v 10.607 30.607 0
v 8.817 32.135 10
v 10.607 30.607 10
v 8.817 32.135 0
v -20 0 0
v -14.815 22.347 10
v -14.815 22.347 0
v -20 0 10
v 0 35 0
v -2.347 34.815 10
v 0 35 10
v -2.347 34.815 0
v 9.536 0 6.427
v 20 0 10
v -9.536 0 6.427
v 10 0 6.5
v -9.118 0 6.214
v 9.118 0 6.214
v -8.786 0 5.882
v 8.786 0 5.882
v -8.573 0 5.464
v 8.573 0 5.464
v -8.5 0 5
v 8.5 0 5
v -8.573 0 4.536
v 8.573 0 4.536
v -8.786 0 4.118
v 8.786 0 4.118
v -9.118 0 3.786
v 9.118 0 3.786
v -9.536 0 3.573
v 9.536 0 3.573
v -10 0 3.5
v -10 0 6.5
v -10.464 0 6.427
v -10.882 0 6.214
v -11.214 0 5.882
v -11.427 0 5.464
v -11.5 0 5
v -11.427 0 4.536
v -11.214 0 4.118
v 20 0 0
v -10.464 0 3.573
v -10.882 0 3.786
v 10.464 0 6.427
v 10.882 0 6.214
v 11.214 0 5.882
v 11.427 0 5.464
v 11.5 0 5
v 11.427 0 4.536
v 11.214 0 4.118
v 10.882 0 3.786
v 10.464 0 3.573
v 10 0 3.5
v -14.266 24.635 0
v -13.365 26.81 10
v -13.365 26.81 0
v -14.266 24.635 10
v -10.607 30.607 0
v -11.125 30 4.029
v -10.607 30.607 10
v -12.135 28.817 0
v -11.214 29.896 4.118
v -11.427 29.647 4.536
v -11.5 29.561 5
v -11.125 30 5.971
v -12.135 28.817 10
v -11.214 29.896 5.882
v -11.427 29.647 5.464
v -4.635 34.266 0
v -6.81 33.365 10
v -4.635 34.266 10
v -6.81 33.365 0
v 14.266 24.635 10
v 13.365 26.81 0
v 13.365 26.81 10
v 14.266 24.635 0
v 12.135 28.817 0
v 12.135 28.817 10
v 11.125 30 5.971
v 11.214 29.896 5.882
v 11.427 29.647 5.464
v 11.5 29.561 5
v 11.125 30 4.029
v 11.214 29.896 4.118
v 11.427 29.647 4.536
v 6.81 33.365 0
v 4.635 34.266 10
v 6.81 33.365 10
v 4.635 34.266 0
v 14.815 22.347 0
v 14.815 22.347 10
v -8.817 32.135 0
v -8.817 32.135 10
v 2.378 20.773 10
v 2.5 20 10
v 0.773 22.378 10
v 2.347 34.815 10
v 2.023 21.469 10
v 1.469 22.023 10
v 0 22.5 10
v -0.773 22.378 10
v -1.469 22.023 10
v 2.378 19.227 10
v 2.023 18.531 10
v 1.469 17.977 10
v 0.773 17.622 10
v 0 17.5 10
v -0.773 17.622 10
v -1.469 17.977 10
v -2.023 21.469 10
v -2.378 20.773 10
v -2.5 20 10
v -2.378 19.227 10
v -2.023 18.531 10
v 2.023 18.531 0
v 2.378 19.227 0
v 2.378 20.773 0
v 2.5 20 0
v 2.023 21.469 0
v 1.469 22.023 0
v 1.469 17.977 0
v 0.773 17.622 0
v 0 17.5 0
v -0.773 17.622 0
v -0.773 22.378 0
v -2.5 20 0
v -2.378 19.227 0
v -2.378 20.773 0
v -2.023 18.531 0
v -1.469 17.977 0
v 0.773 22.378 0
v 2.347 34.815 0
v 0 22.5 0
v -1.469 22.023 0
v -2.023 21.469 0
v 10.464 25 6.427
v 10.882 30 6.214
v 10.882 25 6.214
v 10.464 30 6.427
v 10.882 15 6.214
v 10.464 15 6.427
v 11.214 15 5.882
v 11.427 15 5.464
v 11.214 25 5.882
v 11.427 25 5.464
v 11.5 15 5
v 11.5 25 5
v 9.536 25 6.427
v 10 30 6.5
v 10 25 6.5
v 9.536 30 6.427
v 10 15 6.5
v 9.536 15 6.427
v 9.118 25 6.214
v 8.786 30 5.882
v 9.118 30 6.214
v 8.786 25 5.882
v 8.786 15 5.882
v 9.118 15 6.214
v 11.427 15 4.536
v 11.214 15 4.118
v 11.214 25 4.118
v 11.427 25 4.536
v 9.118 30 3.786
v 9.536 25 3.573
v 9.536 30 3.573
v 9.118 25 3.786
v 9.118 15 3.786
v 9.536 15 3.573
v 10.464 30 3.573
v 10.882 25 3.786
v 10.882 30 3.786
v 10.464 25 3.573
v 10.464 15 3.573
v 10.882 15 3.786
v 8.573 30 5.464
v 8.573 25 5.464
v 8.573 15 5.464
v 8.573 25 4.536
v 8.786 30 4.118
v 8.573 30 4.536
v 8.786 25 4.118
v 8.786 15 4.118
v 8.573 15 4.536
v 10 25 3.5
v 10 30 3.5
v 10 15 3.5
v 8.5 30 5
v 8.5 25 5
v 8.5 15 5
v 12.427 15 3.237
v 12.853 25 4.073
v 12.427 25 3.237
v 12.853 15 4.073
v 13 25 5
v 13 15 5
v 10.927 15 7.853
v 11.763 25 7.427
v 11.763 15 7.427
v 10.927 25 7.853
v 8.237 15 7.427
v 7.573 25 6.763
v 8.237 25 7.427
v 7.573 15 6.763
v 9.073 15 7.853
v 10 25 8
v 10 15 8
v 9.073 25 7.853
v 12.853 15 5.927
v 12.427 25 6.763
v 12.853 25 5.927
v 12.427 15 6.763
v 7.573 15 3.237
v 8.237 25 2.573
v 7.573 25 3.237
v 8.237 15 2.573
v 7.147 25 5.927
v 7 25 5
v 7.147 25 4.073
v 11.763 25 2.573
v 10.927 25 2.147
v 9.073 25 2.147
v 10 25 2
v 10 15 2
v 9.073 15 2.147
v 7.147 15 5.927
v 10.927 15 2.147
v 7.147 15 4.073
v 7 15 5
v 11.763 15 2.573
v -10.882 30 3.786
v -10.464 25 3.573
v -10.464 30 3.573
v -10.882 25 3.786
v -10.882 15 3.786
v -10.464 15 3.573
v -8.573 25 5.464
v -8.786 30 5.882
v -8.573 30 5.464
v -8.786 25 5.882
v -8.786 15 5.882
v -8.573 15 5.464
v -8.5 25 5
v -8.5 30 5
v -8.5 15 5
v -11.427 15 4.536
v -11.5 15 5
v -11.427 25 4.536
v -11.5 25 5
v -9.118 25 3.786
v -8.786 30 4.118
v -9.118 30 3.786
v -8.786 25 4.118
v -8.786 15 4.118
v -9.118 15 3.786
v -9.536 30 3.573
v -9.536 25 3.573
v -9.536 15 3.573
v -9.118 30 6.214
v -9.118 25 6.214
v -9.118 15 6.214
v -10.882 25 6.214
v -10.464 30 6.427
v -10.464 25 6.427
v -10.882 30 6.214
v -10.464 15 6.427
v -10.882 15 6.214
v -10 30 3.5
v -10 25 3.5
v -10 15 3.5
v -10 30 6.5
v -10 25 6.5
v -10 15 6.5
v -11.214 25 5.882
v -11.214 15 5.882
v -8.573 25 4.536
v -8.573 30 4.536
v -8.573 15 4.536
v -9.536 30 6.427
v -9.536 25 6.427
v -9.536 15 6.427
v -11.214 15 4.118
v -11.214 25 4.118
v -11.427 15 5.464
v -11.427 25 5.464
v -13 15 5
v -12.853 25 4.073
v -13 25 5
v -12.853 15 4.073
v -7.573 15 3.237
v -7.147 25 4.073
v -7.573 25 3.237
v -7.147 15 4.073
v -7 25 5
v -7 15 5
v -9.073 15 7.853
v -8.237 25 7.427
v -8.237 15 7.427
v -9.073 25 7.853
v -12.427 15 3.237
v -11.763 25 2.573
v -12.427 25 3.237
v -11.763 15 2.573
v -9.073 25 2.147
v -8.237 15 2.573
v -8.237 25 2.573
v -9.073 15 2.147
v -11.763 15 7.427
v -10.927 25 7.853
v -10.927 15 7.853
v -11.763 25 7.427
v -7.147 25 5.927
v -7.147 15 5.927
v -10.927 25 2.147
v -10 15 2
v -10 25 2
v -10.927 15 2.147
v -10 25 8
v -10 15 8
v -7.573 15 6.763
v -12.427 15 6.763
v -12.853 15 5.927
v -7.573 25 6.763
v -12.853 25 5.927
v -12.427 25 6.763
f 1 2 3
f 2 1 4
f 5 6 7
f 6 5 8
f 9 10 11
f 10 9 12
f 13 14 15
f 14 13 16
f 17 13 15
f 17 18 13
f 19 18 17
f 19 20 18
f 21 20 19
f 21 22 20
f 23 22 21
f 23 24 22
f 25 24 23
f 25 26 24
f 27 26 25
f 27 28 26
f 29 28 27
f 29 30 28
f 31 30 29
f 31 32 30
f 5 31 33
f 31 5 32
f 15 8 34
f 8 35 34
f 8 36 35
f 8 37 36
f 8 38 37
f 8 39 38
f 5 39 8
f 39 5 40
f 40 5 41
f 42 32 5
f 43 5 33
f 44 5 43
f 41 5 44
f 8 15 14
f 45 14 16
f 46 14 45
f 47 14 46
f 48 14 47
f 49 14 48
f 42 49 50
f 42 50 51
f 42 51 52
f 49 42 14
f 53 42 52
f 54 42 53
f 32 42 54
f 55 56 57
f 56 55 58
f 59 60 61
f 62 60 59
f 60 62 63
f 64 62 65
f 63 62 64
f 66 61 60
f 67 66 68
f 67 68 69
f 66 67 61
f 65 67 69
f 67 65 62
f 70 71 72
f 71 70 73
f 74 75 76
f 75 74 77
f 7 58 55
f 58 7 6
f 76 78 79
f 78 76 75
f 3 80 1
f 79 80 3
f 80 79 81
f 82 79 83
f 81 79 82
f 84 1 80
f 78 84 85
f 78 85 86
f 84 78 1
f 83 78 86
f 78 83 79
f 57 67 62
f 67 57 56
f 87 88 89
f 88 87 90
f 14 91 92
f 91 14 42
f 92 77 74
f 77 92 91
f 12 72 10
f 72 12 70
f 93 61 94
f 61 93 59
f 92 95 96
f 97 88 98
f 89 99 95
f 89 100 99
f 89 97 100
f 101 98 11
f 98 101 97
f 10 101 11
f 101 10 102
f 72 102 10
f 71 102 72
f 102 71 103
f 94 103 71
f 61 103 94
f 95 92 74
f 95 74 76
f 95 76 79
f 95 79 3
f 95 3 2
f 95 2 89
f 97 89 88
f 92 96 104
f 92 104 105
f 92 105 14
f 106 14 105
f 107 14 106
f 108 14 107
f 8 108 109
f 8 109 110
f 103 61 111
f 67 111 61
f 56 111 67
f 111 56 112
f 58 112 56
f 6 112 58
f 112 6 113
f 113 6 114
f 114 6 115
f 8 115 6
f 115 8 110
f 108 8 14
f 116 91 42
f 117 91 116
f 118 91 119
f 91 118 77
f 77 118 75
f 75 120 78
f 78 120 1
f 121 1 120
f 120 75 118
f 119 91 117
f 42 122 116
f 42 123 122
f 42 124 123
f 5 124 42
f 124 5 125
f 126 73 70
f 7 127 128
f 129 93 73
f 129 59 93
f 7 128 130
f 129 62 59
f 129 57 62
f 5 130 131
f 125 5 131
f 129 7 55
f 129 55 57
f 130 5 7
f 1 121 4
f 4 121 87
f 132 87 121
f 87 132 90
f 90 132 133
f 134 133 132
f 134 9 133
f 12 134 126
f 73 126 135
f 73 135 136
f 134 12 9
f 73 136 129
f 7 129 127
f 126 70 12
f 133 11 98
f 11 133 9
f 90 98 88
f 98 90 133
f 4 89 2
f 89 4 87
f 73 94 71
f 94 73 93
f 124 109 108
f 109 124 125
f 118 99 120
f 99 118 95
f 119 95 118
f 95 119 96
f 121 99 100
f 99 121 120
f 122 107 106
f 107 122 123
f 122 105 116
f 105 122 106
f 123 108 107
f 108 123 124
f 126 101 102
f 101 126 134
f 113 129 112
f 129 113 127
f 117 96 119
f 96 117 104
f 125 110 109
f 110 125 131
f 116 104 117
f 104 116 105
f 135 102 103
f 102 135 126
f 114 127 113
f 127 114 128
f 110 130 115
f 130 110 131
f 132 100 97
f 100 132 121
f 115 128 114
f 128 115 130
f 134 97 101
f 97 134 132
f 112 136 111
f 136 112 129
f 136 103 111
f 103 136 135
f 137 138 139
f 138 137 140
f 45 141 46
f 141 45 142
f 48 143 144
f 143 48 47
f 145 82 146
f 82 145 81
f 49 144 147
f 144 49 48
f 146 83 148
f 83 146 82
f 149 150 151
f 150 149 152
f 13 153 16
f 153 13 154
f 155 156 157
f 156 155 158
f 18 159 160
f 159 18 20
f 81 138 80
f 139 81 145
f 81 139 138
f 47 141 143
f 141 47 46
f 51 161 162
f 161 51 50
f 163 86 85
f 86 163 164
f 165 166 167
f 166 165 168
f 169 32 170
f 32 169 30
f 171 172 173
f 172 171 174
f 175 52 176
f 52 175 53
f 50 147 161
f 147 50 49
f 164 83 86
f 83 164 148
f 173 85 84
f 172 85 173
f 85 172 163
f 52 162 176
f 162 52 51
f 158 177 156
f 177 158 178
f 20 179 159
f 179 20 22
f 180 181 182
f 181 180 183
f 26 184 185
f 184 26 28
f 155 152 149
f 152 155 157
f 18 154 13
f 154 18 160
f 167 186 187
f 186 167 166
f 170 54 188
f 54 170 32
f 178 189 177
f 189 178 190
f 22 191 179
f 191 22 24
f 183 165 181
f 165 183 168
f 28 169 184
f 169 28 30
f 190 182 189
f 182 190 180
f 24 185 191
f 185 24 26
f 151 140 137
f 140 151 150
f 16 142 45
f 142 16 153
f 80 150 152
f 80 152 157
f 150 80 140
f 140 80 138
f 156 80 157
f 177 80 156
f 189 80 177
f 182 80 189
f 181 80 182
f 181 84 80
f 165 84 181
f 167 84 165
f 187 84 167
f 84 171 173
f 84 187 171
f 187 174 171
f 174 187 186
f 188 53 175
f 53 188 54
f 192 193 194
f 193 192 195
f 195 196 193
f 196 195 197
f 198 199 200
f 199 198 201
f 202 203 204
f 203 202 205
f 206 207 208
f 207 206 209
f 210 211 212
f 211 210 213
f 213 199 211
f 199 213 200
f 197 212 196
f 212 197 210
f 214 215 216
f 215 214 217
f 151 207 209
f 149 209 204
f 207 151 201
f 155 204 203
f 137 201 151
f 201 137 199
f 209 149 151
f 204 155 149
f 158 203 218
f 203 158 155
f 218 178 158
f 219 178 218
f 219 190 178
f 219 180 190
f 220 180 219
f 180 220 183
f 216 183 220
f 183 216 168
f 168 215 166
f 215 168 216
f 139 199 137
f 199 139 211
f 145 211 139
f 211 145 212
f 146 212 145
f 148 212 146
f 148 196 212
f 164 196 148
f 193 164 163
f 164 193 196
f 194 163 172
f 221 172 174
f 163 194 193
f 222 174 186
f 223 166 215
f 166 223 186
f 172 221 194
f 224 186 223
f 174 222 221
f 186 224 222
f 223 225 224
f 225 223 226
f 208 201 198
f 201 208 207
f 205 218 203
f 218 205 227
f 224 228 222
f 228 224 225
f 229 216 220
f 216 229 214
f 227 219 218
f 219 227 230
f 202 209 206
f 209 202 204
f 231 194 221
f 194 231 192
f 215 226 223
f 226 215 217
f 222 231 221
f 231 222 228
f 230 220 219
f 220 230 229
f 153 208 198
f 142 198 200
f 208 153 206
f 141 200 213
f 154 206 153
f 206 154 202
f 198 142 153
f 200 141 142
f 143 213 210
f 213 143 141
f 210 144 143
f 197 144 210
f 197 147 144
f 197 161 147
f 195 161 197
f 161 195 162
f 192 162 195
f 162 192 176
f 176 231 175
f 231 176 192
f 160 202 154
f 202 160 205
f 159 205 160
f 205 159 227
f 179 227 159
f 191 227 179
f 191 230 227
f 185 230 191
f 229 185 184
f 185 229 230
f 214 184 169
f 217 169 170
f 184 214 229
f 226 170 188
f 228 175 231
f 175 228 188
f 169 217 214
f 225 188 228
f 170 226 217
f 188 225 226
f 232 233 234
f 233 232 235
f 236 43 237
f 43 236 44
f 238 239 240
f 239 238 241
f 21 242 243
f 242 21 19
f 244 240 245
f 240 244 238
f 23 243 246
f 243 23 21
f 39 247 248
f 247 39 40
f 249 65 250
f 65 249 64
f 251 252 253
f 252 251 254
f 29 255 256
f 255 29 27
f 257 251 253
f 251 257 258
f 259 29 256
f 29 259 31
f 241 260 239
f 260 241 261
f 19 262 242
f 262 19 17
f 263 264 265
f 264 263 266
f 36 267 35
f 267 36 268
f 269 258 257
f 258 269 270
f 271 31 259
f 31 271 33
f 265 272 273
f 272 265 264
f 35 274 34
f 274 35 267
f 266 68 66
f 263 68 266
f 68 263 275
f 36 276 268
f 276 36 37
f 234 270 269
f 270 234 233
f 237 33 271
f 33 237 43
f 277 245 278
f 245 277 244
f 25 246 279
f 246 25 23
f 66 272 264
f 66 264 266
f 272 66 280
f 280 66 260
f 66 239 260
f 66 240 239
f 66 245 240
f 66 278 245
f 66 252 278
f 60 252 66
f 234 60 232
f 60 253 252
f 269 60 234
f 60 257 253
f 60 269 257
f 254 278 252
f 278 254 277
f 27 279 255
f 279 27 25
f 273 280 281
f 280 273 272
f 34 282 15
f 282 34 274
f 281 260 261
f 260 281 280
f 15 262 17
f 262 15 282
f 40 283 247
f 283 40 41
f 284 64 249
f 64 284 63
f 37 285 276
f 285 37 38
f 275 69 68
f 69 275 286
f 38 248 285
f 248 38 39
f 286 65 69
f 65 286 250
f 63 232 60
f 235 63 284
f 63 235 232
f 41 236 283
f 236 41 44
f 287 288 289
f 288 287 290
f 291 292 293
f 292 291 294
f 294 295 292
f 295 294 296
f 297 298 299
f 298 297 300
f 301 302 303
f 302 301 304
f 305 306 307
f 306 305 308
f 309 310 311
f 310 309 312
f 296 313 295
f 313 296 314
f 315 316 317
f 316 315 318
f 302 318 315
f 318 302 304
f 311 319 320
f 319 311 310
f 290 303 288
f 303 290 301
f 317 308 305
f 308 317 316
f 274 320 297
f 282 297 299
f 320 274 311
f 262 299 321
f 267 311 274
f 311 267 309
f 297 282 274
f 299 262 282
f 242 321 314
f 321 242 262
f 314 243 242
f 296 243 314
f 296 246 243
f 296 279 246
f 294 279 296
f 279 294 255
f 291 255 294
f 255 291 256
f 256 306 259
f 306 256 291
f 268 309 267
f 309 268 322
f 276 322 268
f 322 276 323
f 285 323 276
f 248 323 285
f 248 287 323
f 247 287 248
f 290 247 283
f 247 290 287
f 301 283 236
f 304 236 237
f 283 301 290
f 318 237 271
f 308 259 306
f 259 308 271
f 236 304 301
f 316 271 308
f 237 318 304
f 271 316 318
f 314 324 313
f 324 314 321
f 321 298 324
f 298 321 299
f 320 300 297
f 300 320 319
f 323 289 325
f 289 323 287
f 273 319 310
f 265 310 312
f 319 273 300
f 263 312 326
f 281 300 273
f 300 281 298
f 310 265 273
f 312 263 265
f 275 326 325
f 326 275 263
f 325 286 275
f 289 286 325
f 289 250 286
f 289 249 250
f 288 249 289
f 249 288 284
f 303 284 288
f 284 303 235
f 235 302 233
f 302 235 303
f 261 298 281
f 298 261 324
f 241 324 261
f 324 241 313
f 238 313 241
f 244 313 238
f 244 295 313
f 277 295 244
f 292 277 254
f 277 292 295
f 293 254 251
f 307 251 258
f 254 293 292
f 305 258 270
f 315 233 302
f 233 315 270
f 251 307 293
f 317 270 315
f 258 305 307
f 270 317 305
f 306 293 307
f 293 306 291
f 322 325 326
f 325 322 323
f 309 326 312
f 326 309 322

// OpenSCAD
difference(){
hull(){
linear_extrude(10)
polygon([[-20,0],[0,10],[20,0]]);
translate([0,20,0])cylinder(d=30,h=10,$fn=40);
}
translate([0,20,0])cylinder(d=5,h=10,$fn=20);
translate([10,0,5])rotate([90,0,0])
cylinder(d=3,h=60,$fn=20,center=true);
translate([10,15,5])rotate([-90,0,0])
cylinder(d=6,h=10,$fn=20);
translate([-10,0,5])rotate([90,0,0])
cylinder(d=3,h=60,$fn=20,center=true);
translate([-10,15,5])rotate([-90,0,0])
cylinder(d=6,h=10,$fn=20);
}
